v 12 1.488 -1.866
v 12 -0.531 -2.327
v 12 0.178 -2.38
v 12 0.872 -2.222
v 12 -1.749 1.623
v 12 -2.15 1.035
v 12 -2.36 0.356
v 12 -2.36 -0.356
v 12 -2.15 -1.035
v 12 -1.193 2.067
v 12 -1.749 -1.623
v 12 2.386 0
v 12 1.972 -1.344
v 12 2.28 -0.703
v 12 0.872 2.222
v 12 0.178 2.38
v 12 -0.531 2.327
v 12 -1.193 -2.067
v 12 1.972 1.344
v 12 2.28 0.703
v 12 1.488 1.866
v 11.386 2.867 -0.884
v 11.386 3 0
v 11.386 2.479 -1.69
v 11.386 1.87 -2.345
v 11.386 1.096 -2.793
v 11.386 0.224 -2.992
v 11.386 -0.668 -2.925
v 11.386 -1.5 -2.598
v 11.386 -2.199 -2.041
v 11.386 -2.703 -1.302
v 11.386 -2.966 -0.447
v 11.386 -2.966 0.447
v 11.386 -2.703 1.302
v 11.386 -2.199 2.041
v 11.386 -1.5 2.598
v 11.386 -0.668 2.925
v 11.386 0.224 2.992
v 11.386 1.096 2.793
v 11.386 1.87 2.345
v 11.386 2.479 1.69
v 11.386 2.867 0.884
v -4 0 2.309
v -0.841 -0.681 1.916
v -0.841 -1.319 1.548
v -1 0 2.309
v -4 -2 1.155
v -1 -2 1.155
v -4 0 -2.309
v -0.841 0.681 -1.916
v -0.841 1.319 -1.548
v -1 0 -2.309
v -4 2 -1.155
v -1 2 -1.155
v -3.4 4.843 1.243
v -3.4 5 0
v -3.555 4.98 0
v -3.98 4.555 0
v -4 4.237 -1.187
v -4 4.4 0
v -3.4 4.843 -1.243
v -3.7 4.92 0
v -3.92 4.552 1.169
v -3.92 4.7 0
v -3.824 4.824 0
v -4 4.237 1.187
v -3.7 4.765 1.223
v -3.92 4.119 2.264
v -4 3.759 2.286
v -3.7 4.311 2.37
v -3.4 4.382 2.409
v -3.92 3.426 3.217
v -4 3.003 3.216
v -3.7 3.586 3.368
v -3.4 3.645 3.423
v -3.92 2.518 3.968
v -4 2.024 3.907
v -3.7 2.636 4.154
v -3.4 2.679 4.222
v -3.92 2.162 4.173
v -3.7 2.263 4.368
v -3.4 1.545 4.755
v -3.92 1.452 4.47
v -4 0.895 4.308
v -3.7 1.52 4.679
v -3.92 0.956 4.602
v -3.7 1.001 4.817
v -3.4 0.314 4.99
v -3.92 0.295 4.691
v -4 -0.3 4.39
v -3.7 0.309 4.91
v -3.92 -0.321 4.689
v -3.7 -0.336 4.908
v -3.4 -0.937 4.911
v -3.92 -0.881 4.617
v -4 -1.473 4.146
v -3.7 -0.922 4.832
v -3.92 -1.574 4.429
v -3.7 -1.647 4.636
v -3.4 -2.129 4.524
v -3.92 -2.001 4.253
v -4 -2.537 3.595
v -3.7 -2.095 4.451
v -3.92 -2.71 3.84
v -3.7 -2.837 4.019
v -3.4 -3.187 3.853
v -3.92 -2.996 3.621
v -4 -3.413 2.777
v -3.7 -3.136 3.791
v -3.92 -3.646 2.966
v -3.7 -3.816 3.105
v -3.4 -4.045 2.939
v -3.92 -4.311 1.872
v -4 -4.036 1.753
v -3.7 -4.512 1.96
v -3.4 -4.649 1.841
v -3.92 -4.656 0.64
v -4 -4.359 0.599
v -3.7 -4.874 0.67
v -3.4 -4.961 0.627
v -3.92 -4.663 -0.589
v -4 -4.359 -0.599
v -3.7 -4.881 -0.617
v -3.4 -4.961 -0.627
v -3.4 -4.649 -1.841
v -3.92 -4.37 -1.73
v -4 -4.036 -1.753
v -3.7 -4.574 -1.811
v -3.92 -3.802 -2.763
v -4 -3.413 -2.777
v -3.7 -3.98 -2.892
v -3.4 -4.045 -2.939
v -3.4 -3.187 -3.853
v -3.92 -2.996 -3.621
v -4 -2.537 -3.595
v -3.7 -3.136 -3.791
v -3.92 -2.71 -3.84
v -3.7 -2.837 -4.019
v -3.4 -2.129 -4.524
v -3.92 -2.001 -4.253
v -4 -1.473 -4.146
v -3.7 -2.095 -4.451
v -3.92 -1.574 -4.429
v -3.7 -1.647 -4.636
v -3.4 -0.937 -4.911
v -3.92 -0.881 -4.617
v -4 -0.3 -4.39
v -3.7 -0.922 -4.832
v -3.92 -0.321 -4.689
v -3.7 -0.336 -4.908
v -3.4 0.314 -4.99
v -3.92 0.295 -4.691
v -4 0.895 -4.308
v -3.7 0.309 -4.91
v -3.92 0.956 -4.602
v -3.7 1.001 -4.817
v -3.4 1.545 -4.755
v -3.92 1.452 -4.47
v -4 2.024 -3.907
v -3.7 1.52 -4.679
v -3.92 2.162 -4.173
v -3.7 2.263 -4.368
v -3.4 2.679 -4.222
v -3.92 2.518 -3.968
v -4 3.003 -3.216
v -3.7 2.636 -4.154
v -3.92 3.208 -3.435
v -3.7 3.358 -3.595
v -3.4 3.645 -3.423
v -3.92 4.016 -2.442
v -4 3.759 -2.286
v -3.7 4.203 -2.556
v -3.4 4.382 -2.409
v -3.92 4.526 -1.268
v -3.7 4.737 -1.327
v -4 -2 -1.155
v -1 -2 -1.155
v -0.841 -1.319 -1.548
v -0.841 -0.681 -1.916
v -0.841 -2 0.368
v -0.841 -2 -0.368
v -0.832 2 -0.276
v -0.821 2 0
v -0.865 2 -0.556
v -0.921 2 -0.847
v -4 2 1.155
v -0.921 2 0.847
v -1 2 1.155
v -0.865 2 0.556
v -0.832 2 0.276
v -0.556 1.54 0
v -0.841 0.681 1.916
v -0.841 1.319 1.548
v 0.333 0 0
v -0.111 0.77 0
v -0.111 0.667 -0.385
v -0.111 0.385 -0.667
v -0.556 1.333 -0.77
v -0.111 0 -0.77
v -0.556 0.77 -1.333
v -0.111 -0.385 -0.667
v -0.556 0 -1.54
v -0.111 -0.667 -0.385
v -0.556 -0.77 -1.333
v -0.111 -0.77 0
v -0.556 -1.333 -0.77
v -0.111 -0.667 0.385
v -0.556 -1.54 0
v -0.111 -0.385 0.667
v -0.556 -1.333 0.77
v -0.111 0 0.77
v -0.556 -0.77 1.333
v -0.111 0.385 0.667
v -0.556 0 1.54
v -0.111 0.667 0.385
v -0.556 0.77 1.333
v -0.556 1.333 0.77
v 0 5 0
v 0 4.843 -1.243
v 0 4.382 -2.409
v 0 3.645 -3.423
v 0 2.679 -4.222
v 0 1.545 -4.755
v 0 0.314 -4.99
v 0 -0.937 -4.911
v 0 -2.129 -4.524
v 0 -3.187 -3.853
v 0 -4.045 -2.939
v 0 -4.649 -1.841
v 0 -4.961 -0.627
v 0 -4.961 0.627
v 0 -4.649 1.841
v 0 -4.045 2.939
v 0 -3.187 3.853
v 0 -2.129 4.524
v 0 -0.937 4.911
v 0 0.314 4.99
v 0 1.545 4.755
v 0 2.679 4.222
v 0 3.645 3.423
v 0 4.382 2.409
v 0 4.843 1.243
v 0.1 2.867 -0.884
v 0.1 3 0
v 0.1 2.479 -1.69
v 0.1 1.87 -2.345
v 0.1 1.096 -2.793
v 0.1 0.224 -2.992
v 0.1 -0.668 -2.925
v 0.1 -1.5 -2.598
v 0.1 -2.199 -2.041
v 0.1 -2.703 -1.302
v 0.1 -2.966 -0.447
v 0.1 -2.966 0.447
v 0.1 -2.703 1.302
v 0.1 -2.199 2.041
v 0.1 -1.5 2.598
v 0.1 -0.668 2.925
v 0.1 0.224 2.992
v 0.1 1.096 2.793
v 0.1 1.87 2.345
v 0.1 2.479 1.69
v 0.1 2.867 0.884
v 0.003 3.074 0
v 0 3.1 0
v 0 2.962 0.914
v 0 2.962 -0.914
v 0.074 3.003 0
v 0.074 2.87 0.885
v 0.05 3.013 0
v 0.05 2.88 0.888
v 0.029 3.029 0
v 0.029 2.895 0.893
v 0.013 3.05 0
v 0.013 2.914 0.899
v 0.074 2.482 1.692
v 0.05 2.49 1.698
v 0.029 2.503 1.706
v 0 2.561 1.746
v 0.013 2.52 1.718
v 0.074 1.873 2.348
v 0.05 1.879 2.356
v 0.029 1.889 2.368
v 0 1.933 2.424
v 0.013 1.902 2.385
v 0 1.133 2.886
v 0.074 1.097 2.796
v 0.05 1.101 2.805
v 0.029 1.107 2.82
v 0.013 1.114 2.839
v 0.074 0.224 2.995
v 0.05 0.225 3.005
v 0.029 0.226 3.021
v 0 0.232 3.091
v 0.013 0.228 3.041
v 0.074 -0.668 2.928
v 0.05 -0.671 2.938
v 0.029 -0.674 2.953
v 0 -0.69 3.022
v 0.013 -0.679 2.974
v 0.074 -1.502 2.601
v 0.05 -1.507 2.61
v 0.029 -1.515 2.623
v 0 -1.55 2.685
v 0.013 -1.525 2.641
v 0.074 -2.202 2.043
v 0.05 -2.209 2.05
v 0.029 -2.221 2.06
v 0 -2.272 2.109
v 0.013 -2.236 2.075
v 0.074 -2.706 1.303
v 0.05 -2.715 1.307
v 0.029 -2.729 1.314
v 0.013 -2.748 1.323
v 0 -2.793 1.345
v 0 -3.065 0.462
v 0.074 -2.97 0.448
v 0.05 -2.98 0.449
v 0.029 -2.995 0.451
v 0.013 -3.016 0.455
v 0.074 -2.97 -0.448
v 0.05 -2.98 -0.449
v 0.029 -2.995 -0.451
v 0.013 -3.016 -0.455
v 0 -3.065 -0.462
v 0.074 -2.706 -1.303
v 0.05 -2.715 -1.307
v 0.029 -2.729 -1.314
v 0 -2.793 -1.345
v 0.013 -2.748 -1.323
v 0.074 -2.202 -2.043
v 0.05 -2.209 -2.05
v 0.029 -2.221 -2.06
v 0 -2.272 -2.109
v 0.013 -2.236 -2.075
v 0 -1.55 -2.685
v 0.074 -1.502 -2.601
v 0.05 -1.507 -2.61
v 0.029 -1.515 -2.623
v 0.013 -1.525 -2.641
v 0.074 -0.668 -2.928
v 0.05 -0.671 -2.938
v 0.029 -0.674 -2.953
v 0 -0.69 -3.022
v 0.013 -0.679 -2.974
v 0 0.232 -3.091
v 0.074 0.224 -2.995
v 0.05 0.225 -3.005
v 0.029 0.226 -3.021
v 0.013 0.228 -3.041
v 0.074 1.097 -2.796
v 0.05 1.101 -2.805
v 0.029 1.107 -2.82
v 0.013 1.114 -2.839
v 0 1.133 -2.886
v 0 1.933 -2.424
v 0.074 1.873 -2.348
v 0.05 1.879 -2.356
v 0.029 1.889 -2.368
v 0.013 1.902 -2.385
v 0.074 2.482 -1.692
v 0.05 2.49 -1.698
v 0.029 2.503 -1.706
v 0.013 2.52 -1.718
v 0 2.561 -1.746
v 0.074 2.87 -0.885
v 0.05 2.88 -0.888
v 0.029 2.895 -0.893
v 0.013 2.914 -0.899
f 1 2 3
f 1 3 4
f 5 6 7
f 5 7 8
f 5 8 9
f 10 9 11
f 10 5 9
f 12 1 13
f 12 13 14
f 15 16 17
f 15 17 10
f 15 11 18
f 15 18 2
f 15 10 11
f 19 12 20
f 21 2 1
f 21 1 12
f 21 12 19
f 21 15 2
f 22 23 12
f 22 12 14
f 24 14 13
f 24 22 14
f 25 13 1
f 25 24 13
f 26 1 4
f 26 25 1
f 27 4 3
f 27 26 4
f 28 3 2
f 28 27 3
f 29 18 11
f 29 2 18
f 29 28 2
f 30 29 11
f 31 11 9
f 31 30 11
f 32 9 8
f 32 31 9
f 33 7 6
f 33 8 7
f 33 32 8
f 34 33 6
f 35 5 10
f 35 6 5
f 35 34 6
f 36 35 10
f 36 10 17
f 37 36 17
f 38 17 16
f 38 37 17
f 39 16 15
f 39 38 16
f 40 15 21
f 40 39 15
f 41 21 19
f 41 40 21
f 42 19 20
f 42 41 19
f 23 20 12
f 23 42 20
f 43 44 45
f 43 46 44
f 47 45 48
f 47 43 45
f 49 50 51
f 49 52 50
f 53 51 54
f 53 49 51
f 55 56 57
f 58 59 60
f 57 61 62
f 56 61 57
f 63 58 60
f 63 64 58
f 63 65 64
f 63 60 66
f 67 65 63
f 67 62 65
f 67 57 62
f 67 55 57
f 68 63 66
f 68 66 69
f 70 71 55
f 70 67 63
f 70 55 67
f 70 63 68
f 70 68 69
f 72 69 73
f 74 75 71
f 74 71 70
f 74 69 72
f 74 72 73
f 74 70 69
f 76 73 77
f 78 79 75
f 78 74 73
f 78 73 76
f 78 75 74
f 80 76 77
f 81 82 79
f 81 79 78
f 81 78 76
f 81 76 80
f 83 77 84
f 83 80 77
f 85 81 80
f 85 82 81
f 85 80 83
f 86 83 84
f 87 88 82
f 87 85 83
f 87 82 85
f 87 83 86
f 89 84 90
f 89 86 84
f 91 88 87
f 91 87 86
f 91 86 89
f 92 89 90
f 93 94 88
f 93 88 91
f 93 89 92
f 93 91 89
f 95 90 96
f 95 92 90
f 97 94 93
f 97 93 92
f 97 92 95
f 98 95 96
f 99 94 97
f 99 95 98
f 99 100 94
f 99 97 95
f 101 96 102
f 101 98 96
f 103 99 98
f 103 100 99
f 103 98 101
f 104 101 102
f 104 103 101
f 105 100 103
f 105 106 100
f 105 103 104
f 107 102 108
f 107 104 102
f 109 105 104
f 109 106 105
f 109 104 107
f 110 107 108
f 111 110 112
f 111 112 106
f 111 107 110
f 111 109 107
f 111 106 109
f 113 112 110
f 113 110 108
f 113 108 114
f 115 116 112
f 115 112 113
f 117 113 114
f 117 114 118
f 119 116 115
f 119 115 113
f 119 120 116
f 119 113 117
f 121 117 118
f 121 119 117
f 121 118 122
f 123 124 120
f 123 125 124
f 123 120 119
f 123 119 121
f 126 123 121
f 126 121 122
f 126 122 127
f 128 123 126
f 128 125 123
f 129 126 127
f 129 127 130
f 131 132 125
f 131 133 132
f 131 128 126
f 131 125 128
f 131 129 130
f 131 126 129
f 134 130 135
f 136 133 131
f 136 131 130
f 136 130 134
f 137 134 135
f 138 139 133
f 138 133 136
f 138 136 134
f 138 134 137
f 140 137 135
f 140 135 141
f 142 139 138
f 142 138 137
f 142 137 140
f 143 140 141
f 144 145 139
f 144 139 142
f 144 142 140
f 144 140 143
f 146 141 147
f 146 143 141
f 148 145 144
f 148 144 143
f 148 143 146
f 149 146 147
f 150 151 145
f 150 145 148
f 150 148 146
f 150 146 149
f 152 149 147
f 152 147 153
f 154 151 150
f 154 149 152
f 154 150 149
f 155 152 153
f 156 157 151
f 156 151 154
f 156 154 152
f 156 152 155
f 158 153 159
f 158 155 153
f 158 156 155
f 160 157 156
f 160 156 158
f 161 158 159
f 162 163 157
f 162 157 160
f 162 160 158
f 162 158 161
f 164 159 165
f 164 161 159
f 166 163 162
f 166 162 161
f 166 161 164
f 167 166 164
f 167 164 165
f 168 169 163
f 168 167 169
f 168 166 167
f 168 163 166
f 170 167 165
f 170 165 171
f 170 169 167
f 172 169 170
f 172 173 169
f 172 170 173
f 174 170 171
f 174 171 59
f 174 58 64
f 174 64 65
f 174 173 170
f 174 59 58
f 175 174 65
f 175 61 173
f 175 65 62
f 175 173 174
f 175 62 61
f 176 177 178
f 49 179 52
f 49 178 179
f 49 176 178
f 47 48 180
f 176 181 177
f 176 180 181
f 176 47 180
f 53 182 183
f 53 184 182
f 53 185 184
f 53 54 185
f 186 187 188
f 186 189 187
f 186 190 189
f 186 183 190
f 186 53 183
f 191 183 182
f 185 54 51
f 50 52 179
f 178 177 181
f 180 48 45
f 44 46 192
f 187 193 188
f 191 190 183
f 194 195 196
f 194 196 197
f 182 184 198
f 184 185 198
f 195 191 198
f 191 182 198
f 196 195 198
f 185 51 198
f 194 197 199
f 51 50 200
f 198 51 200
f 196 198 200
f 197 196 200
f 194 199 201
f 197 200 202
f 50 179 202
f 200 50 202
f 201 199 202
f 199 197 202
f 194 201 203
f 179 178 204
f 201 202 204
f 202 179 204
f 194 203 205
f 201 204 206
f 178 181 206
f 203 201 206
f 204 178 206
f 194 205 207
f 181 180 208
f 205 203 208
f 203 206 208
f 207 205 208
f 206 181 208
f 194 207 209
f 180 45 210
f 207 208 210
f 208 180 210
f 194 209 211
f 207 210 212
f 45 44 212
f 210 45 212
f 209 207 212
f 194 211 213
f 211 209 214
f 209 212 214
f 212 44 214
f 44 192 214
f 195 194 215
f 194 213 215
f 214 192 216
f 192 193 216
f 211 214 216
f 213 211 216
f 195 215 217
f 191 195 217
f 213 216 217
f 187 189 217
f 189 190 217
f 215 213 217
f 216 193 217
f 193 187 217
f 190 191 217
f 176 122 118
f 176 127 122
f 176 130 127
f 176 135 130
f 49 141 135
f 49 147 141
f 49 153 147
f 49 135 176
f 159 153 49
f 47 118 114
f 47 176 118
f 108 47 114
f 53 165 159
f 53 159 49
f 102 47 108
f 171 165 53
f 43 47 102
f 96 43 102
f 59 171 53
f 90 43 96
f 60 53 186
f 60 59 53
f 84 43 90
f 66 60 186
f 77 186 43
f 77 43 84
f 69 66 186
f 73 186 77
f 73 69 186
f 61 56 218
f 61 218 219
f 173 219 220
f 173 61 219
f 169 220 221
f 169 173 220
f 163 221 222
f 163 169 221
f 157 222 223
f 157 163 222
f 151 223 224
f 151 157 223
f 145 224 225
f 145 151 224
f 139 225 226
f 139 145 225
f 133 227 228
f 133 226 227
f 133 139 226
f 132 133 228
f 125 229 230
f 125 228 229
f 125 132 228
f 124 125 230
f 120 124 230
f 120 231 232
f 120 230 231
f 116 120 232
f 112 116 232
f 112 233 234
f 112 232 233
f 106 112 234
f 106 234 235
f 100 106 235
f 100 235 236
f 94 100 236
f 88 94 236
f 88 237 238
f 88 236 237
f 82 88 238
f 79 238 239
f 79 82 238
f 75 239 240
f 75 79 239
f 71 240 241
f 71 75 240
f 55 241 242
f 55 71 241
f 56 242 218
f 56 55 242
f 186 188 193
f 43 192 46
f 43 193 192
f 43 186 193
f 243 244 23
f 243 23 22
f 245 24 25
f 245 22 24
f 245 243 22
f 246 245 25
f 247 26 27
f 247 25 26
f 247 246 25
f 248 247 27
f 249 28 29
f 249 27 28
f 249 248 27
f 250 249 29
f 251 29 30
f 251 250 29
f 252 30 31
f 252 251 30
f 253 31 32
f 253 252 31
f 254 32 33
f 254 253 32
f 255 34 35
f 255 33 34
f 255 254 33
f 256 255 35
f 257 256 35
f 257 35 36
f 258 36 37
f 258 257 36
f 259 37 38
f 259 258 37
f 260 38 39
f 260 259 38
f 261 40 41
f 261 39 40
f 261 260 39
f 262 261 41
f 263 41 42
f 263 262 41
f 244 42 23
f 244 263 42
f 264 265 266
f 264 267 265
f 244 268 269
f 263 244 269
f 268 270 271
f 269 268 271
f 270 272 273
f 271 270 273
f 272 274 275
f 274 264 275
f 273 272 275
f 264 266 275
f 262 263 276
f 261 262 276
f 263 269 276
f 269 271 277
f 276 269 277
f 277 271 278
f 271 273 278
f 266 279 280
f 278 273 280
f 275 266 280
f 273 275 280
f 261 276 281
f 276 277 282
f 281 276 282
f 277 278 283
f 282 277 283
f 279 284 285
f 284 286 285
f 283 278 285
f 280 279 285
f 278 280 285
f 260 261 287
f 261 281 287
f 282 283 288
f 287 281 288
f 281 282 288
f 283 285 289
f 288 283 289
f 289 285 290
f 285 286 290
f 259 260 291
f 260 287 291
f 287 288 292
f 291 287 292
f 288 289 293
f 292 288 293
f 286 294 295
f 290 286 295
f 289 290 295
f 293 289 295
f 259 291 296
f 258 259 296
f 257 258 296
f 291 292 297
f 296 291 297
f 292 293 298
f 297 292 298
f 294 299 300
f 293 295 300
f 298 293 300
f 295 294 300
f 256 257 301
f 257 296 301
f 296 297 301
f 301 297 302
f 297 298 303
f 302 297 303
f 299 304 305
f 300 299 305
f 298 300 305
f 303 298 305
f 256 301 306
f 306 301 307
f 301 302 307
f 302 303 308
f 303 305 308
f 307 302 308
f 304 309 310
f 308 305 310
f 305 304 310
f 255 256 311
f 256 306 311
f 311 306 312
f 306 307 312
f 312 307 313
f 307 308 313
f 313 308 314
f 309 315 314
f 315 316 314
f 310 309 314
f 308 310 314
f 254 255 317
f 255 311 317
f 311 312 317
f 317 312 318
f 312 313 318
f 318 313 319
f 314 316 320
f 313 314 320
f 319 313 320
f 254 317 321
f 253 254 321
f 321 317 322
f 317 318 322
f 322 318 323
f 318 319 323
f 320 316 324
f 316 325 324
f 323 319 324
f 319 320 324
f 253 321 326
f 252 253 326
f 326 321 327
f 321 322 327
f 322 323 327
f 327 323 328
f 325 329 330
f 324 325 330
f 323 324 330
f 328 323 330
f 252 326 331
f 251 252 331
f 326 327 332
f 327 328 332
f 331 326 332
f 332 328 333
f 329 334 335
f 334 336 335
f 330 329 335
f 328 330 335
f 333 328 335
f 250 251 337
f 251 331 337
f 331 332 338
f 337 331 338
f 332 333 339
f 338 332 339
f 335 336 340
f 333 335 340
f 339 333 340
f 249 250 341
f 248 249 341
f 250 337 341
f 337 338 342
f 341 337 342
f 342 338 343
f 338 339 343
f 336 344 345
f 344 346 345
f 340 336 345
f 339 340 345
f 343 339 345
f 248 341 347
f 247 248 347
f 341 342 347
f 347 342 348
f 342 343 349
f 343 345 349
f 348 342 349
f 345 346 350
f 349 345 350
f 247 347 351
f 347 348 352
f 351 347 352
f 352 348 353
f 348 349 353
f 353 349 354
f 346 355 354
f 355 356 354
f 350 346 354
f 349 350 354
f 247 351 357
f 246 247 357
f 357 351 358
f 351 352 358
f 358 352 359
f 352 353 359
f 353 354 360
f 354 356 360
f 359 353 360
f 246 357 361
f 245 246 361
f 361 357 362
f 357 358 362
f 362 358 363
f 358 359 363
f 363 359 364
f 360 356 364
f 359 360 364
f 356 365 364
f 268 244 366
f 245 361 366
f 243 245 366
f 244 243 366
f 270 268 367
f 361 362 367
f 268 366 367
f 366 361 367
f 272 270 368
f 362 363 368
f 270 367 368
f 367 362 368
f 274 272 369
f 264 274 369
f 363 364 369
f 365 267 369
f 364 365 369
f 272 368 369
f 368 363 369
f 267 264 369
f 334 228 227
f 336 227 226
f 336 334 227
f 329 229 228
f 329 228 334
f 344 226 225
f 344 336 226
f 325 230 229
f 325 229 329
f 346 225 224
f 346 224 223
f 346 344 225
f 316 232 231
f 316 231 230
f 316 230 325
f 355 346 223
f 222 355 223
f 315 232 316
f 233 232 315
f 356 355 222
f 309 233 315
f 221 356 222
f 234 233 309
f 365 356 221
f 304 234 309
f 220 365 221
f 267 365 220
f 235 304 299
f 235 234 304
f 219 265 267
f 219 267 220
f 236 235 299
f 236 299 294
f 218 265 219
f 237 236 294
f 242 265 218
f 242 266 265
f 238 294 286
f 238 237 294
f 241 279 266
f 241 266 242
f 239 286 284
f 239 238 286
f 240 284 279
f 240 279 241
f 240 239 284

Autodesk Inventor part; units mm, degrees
ref_plane "YZ Plane" through (0, 0, 0) normal (1, 0, 0) x (0, 1, 0)
ref_plane "XZ Plane" through (0, 0, 0) normal (0, 1, 0) x (-1, 0, 0)
sketch "Skizze1" plane through (0, 0, 0) normal (0, 0, 1) x (1, 0, 0)
  line L0 (0.3333, 0) -> (12, 0)
  line L1 (12, 0) -> (12, 3)
  line L2 (12, 3) -> (3, 3)
  line L3 (3, 3) -> (2.3864, 3)
  line L4 (2.3864, 3) -> (0, 3)
  line L5 (0, 3) -> (0, 5)
  line L6 (0, 5) -> (-4, 5)
  line L7 (-4, 5) -> (-4, 2.3094)
  line L8 (-4, 2.3094) -> (-1, 2.3094)
  line L9 (-1, 2.3094) -> (0.3333, 0)
  line L10 (-7.2, 0) -> (15.2, 0) projected
  line L11 (0, -1) -> (0, 6) projected
  line L12 (3, 3) -> (0, 3) construction
  dimension "d1" = 9
  dimension "d2" = 0.6136
  dimension "d3" = 4
  dimension "d4" = 3
  dimension "d5" = 60
  dimension "d6" = 6
  dimension "d7" = 6
  dimension "d8" = 4.6188
  dimension "d9" = 10
  dimension "d26" = 12
revolve "Körper" add sketch "Skizze1" angle 360 about axis through (0.3333, 0, 0) along (1, 0, 0) contours L9 L11 L4 L3 L2 L1 L0 | L9 L8 L7 L6 L5 L11
sketch "Skizze2" plane through (-4, 0, 0) normal (-1, 0, 0) x (0, 0, 1)
  circle A0 centre (0, 0) radius 2.3094 projected
  line L0 (0, -7) -> (0, 7) projected
  line L1 (-7, 0) -> (7, 0) projected
  line L2 (2.3094, 0) -> (1.1547, -2)
  line L3 (1.1547, -2) -> (-1.1547, -2)
  line L4 (-1.1547, -2) -> (-2.3094, 0)
  line L5 (-2.3094, 0) -> (-1.1547, 2)
  line L6 (-1.1547, 2) -> (1.1547, 2)
  line L7 (1.1547, 2) -> (2.3094, 0)
extrude "Loch" add sketch "Skizze2" against normal up to next contours L7 A0 | A0 L2 | L6 L0 A0 | A0 L0 L3 | L0 L6 A0 | A0 L3 L0 | L4 A0 | A0 L5
fillet "Rundung1" radius 0.6 1 edges at (-4, -5, 0)
thread "Gewinde" size "M6x1" class "6g" standard "ISO Metric profile" length 9
chamfer "Fase1" distance 0.6135 distance2 0.6135 1 edges at (12, -3, 0) measured on face at (12, 0.705, 0.3049)
ref_plane "Work Plane1" through (29, 0, 0) normal (0, -1, 0) x (1, 0, 0)
fillet "Fillet2" radius 0.1 1 edges at (0, -3, 0)
equation "\"d1\" = GEL"
equation "\"d3\" = KOH"
equation "\"d4\" = INTI"
equation "\"d6\" = GD"
equation "\"d7\" = BDM"
equation "\"d8\" = 1.1547 * SW"
equation "\"d9\" = KOD"
equation "\"d26\" = NLG"
equation "\"d30\" = R"
equation "\"d17\" = RR"
equation "\"d13\" = GEL"
equation "\"d15\" = -0.5 * SPD + 0.5 * GD"
equation "\"d16\" = GUL"
equation "\"GD\" = NND"
equation "\"NLG\" = 12"
equation "\"GEL\" = 9"
equation "\"KOD\" = 10"
equation "\"KOH\" = 4"
equation "\"INTI\" = 3"
equation "\"GAL\" = 0.61345 * PTC"
equation "\"GUL\" = 0.61345 * PTC"
equation "\"BDM\" = NND"
equation "\"SW\" = 4"
equation "\"RR\" = 0.6"
equation "\"SPD\" = NND - 1.2269 * PTC"
equation "\"R\" = 0.1"
equation "\"TOA\" = 30deg"
equation "\"GD1\" = THREADDIA - 1.2269 * PTC"
equation "\"THREADDIA\" = 6"
equation "\"FAWI\" = 45deg"
equation "\"ANG\" = 120deg"
equation "\"PTC\" = 1"
equation "\"NND\" = 6"
equation "\"E0\" = 1.155 * SW"
properties part number "DIN 7984 - M6 x 12" material "Stahl, weich"
